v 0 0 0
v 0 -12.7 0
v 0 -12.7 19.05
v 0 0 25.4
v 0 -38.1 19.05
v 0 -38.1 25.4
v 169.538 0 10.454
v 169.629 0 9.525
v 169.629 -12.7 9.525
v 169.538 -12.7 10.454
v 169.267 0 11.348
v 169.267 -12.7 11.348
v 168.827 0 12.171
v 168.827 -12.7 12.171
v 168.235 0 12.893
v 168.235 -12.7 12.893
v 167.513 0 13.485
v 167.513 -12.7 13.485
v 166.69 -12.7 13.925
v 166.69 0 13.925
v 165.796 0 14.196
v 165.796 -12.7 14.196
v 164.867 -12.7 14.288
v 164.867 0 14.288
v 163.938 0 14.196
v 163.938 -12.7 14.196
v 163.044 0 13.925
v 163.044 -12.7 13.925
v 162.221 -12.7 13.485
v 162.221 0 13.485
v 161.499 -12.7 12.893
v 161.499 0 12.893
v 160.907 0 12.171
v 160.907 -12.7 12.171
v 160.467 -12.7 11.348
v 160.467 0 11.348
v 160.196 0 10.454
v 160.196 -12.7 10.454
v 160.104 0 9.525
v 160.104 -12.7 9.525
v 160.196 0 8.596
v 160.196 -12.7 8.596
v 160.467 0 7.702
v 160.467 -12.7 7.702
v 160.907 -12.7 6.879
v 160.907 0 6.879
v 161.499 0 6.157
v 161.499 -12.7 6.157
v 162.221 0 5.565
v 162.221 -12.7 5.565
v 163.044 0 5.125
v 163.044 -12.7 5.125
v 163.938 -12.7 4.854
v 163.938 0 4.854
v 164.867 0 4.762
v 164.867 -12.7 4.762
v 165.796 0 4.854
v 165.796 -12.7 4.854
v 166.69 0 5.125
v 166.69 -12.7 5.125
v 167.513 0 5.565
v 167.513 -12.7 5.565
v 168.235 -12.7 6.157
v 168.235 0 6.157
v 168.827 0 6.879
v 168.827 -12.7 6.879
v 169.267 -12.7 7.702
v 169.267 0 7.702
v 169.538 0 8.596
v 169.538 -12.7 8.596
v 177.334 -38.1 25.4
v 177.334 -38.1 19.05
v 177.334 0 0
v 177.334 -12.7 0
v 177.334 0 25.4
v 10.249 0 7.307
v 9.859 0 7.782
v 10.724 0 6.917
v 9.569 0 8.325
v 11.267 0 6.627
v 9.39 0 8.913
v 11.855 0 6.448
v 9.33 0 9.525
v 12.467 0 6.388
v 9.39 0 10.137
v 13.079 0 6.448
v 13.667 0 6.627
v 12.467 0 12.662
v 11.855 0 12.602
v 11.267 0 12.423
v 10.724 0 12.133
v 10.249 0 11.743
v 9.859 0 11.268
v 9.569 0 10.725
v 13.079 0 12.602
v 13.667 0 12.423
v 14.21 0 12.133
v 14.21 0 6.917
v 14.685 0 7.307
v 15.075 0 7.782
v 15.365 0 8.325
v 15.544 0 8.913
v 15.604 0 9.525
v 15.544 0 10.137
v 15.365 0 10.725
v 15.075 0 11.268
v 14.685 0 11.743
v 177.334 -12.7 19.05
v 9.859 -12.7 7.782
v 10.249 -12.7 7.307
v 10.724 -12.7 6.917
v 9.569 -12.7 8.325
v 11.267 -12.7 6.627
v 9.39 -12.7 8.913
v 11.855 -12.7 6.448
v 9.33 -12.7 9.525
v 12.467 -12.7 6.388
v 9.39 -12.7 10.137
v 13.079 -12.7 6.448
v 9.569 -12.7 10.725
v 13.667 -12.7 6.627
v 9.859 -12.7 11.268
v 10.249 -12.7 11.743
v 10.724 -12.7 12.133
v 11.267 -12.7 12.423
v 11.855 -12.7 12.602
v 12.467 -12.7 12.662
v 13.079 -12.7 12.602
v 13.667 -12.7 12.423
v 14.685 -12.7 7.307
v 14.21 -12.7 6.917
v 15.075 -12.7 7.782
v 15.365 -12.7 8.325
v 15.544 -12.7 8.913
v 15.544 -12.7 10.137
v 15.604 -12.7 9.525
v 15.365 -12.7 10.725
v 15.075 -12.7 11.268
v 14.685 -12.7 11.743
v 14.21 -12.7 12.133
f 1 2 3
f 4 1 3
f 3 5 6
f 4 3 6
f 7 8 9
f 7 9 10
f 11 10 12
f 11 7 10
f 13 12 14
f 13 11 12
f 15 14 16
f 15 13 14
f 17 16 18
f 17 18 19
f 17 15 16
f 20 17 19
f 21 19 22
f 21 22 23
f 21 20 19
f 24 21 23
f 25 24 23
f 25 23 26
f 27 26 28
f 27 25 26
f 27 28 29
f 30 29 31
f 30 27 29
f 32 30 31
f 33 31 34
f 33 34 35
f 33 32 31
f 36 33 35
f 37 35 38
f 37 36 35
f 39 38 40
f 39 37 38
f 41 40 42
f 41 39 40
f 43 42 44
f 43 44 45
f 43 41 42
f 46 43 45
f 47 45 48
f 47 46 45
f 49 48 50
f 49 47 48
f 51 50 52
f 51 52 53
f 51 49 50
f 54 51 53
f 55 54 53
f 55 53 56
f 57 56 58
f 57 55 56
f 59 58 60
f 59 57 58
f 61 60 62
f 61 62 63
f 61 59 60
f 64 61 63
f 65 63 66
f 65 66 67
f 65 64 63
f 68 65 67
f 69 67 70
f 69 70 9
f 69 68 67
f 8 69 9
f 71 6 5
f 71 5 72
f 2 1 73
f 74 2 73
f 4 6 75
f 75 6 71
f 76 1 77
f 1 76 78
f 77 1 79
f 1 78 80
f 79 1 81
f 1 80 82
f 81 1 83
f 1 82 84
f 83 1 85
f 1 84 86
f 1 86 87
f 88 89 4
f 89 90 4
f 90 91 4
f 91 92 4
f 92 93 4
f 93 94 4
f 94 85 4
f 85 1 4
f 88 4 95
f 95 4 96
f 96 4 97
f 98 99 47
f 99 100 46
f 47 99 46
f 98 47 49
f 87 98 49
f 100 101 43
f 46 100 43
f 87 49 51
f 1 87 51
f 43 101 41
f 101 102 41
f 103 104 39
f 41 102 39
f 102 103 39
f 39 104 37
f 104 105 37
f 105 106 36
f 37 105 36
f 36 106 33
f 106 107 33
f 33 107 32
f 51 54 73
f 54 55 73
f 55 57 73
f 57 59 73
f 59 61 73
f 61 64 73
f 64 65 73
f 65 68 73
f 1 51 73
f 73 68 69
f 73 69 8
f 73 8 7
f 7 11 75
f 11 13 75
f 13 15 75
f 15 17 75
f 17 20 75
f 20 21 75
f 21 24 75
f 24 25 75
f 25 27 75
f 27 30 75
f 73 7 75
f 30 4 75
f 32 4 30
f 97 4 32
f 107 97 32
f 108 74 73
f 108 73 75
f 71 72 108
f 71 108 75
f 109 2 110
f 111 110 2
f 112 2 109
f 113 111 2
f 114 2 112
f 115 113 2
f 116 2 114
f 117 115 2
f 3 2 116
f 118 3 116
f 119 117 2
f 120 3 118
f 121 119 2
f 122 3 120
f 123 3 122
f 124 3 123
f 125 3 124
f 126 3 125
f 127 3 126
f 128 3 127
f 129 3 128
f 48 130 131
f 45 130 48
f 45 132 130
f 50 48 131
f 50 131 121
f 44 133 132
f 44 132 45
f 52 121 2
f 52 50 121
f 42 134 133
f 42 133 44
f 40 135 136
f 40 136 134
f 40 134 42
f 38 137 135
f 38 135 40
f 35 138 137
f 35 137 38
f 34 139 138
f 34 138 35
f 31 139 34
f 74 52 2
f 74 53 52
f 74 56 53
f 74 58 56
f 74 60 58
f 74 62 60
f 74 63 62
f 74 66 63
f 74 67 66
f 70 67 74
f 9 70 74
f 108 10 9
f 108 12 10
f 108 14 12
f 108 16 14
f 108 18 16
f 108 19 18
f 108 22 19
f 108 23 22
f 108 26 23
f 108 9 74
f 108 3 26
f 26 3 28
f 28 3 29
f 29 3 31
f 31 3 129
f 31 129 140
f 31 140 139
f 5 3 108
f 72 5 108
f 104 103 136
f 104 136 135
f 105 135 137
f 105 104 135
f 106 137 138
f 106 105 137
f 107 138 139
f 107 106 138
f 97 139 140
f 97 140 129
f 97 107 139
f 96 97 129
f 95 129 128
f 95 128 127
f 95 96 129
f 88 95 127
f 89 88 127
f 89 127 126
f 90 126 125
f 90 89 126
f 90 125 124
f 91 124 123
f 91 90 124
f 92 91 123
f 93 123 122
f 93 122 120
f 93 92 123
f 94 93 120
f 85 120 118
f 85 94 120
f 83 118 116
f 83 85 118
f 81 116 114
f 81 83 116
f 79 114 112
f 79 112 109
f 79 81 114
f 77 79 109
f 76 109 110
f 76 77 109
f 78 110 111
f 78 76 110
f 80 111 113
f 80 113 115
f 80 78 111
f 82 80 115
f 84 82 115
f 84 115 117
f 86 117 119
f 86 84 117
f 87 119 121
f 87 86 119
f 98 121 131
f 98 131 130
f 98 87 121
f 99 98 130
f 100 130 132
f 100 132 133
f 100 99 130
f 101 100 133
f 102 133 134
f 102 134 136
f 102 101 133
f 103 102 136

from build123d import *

# Parameters (mm, degrees)
F0_W          = 177.334
F0_H          = 19.05
F0_R          = 3.1369
F0_R_2        = 4.7625
F1_DEPTH      = 12.7
F2_W          = 177.334
F2_H          = 6.35
F3_DEPTH      = 25.4
F3_DEPTH_BACK = 12.7


with BuildPart() as f1:
    # F0 (on Front) → F1 (new body)
    with BuildSketch(Plane.XZ):
        with Locations((88.667, 9.525)):
            Rectangle(F0_W, F0_H)
        with Locations((12.467, 9.525)):
            Circle(F0_R, mode=Mode.SUBTRACT)
        with Locations((164.867, 9.525)):
            Circle(F0_R_2, mode=Mode.SUBTRACT)
    extrude(amount=F1_DEPTH)

    # F2 (on face) → F3 (join, two sides)
    with BuildSketch(Plane.XZ.offset(12.7)) as f3_sk:
        with Locations((88.667, 22.225)):
            Rectangle(F2_W, F2_H)
    extrude(amount=F3_DEPTH)
    extrude(f3_sk.sketch, amount=-F3_DEPTH_BACK)


solid = f1.part
